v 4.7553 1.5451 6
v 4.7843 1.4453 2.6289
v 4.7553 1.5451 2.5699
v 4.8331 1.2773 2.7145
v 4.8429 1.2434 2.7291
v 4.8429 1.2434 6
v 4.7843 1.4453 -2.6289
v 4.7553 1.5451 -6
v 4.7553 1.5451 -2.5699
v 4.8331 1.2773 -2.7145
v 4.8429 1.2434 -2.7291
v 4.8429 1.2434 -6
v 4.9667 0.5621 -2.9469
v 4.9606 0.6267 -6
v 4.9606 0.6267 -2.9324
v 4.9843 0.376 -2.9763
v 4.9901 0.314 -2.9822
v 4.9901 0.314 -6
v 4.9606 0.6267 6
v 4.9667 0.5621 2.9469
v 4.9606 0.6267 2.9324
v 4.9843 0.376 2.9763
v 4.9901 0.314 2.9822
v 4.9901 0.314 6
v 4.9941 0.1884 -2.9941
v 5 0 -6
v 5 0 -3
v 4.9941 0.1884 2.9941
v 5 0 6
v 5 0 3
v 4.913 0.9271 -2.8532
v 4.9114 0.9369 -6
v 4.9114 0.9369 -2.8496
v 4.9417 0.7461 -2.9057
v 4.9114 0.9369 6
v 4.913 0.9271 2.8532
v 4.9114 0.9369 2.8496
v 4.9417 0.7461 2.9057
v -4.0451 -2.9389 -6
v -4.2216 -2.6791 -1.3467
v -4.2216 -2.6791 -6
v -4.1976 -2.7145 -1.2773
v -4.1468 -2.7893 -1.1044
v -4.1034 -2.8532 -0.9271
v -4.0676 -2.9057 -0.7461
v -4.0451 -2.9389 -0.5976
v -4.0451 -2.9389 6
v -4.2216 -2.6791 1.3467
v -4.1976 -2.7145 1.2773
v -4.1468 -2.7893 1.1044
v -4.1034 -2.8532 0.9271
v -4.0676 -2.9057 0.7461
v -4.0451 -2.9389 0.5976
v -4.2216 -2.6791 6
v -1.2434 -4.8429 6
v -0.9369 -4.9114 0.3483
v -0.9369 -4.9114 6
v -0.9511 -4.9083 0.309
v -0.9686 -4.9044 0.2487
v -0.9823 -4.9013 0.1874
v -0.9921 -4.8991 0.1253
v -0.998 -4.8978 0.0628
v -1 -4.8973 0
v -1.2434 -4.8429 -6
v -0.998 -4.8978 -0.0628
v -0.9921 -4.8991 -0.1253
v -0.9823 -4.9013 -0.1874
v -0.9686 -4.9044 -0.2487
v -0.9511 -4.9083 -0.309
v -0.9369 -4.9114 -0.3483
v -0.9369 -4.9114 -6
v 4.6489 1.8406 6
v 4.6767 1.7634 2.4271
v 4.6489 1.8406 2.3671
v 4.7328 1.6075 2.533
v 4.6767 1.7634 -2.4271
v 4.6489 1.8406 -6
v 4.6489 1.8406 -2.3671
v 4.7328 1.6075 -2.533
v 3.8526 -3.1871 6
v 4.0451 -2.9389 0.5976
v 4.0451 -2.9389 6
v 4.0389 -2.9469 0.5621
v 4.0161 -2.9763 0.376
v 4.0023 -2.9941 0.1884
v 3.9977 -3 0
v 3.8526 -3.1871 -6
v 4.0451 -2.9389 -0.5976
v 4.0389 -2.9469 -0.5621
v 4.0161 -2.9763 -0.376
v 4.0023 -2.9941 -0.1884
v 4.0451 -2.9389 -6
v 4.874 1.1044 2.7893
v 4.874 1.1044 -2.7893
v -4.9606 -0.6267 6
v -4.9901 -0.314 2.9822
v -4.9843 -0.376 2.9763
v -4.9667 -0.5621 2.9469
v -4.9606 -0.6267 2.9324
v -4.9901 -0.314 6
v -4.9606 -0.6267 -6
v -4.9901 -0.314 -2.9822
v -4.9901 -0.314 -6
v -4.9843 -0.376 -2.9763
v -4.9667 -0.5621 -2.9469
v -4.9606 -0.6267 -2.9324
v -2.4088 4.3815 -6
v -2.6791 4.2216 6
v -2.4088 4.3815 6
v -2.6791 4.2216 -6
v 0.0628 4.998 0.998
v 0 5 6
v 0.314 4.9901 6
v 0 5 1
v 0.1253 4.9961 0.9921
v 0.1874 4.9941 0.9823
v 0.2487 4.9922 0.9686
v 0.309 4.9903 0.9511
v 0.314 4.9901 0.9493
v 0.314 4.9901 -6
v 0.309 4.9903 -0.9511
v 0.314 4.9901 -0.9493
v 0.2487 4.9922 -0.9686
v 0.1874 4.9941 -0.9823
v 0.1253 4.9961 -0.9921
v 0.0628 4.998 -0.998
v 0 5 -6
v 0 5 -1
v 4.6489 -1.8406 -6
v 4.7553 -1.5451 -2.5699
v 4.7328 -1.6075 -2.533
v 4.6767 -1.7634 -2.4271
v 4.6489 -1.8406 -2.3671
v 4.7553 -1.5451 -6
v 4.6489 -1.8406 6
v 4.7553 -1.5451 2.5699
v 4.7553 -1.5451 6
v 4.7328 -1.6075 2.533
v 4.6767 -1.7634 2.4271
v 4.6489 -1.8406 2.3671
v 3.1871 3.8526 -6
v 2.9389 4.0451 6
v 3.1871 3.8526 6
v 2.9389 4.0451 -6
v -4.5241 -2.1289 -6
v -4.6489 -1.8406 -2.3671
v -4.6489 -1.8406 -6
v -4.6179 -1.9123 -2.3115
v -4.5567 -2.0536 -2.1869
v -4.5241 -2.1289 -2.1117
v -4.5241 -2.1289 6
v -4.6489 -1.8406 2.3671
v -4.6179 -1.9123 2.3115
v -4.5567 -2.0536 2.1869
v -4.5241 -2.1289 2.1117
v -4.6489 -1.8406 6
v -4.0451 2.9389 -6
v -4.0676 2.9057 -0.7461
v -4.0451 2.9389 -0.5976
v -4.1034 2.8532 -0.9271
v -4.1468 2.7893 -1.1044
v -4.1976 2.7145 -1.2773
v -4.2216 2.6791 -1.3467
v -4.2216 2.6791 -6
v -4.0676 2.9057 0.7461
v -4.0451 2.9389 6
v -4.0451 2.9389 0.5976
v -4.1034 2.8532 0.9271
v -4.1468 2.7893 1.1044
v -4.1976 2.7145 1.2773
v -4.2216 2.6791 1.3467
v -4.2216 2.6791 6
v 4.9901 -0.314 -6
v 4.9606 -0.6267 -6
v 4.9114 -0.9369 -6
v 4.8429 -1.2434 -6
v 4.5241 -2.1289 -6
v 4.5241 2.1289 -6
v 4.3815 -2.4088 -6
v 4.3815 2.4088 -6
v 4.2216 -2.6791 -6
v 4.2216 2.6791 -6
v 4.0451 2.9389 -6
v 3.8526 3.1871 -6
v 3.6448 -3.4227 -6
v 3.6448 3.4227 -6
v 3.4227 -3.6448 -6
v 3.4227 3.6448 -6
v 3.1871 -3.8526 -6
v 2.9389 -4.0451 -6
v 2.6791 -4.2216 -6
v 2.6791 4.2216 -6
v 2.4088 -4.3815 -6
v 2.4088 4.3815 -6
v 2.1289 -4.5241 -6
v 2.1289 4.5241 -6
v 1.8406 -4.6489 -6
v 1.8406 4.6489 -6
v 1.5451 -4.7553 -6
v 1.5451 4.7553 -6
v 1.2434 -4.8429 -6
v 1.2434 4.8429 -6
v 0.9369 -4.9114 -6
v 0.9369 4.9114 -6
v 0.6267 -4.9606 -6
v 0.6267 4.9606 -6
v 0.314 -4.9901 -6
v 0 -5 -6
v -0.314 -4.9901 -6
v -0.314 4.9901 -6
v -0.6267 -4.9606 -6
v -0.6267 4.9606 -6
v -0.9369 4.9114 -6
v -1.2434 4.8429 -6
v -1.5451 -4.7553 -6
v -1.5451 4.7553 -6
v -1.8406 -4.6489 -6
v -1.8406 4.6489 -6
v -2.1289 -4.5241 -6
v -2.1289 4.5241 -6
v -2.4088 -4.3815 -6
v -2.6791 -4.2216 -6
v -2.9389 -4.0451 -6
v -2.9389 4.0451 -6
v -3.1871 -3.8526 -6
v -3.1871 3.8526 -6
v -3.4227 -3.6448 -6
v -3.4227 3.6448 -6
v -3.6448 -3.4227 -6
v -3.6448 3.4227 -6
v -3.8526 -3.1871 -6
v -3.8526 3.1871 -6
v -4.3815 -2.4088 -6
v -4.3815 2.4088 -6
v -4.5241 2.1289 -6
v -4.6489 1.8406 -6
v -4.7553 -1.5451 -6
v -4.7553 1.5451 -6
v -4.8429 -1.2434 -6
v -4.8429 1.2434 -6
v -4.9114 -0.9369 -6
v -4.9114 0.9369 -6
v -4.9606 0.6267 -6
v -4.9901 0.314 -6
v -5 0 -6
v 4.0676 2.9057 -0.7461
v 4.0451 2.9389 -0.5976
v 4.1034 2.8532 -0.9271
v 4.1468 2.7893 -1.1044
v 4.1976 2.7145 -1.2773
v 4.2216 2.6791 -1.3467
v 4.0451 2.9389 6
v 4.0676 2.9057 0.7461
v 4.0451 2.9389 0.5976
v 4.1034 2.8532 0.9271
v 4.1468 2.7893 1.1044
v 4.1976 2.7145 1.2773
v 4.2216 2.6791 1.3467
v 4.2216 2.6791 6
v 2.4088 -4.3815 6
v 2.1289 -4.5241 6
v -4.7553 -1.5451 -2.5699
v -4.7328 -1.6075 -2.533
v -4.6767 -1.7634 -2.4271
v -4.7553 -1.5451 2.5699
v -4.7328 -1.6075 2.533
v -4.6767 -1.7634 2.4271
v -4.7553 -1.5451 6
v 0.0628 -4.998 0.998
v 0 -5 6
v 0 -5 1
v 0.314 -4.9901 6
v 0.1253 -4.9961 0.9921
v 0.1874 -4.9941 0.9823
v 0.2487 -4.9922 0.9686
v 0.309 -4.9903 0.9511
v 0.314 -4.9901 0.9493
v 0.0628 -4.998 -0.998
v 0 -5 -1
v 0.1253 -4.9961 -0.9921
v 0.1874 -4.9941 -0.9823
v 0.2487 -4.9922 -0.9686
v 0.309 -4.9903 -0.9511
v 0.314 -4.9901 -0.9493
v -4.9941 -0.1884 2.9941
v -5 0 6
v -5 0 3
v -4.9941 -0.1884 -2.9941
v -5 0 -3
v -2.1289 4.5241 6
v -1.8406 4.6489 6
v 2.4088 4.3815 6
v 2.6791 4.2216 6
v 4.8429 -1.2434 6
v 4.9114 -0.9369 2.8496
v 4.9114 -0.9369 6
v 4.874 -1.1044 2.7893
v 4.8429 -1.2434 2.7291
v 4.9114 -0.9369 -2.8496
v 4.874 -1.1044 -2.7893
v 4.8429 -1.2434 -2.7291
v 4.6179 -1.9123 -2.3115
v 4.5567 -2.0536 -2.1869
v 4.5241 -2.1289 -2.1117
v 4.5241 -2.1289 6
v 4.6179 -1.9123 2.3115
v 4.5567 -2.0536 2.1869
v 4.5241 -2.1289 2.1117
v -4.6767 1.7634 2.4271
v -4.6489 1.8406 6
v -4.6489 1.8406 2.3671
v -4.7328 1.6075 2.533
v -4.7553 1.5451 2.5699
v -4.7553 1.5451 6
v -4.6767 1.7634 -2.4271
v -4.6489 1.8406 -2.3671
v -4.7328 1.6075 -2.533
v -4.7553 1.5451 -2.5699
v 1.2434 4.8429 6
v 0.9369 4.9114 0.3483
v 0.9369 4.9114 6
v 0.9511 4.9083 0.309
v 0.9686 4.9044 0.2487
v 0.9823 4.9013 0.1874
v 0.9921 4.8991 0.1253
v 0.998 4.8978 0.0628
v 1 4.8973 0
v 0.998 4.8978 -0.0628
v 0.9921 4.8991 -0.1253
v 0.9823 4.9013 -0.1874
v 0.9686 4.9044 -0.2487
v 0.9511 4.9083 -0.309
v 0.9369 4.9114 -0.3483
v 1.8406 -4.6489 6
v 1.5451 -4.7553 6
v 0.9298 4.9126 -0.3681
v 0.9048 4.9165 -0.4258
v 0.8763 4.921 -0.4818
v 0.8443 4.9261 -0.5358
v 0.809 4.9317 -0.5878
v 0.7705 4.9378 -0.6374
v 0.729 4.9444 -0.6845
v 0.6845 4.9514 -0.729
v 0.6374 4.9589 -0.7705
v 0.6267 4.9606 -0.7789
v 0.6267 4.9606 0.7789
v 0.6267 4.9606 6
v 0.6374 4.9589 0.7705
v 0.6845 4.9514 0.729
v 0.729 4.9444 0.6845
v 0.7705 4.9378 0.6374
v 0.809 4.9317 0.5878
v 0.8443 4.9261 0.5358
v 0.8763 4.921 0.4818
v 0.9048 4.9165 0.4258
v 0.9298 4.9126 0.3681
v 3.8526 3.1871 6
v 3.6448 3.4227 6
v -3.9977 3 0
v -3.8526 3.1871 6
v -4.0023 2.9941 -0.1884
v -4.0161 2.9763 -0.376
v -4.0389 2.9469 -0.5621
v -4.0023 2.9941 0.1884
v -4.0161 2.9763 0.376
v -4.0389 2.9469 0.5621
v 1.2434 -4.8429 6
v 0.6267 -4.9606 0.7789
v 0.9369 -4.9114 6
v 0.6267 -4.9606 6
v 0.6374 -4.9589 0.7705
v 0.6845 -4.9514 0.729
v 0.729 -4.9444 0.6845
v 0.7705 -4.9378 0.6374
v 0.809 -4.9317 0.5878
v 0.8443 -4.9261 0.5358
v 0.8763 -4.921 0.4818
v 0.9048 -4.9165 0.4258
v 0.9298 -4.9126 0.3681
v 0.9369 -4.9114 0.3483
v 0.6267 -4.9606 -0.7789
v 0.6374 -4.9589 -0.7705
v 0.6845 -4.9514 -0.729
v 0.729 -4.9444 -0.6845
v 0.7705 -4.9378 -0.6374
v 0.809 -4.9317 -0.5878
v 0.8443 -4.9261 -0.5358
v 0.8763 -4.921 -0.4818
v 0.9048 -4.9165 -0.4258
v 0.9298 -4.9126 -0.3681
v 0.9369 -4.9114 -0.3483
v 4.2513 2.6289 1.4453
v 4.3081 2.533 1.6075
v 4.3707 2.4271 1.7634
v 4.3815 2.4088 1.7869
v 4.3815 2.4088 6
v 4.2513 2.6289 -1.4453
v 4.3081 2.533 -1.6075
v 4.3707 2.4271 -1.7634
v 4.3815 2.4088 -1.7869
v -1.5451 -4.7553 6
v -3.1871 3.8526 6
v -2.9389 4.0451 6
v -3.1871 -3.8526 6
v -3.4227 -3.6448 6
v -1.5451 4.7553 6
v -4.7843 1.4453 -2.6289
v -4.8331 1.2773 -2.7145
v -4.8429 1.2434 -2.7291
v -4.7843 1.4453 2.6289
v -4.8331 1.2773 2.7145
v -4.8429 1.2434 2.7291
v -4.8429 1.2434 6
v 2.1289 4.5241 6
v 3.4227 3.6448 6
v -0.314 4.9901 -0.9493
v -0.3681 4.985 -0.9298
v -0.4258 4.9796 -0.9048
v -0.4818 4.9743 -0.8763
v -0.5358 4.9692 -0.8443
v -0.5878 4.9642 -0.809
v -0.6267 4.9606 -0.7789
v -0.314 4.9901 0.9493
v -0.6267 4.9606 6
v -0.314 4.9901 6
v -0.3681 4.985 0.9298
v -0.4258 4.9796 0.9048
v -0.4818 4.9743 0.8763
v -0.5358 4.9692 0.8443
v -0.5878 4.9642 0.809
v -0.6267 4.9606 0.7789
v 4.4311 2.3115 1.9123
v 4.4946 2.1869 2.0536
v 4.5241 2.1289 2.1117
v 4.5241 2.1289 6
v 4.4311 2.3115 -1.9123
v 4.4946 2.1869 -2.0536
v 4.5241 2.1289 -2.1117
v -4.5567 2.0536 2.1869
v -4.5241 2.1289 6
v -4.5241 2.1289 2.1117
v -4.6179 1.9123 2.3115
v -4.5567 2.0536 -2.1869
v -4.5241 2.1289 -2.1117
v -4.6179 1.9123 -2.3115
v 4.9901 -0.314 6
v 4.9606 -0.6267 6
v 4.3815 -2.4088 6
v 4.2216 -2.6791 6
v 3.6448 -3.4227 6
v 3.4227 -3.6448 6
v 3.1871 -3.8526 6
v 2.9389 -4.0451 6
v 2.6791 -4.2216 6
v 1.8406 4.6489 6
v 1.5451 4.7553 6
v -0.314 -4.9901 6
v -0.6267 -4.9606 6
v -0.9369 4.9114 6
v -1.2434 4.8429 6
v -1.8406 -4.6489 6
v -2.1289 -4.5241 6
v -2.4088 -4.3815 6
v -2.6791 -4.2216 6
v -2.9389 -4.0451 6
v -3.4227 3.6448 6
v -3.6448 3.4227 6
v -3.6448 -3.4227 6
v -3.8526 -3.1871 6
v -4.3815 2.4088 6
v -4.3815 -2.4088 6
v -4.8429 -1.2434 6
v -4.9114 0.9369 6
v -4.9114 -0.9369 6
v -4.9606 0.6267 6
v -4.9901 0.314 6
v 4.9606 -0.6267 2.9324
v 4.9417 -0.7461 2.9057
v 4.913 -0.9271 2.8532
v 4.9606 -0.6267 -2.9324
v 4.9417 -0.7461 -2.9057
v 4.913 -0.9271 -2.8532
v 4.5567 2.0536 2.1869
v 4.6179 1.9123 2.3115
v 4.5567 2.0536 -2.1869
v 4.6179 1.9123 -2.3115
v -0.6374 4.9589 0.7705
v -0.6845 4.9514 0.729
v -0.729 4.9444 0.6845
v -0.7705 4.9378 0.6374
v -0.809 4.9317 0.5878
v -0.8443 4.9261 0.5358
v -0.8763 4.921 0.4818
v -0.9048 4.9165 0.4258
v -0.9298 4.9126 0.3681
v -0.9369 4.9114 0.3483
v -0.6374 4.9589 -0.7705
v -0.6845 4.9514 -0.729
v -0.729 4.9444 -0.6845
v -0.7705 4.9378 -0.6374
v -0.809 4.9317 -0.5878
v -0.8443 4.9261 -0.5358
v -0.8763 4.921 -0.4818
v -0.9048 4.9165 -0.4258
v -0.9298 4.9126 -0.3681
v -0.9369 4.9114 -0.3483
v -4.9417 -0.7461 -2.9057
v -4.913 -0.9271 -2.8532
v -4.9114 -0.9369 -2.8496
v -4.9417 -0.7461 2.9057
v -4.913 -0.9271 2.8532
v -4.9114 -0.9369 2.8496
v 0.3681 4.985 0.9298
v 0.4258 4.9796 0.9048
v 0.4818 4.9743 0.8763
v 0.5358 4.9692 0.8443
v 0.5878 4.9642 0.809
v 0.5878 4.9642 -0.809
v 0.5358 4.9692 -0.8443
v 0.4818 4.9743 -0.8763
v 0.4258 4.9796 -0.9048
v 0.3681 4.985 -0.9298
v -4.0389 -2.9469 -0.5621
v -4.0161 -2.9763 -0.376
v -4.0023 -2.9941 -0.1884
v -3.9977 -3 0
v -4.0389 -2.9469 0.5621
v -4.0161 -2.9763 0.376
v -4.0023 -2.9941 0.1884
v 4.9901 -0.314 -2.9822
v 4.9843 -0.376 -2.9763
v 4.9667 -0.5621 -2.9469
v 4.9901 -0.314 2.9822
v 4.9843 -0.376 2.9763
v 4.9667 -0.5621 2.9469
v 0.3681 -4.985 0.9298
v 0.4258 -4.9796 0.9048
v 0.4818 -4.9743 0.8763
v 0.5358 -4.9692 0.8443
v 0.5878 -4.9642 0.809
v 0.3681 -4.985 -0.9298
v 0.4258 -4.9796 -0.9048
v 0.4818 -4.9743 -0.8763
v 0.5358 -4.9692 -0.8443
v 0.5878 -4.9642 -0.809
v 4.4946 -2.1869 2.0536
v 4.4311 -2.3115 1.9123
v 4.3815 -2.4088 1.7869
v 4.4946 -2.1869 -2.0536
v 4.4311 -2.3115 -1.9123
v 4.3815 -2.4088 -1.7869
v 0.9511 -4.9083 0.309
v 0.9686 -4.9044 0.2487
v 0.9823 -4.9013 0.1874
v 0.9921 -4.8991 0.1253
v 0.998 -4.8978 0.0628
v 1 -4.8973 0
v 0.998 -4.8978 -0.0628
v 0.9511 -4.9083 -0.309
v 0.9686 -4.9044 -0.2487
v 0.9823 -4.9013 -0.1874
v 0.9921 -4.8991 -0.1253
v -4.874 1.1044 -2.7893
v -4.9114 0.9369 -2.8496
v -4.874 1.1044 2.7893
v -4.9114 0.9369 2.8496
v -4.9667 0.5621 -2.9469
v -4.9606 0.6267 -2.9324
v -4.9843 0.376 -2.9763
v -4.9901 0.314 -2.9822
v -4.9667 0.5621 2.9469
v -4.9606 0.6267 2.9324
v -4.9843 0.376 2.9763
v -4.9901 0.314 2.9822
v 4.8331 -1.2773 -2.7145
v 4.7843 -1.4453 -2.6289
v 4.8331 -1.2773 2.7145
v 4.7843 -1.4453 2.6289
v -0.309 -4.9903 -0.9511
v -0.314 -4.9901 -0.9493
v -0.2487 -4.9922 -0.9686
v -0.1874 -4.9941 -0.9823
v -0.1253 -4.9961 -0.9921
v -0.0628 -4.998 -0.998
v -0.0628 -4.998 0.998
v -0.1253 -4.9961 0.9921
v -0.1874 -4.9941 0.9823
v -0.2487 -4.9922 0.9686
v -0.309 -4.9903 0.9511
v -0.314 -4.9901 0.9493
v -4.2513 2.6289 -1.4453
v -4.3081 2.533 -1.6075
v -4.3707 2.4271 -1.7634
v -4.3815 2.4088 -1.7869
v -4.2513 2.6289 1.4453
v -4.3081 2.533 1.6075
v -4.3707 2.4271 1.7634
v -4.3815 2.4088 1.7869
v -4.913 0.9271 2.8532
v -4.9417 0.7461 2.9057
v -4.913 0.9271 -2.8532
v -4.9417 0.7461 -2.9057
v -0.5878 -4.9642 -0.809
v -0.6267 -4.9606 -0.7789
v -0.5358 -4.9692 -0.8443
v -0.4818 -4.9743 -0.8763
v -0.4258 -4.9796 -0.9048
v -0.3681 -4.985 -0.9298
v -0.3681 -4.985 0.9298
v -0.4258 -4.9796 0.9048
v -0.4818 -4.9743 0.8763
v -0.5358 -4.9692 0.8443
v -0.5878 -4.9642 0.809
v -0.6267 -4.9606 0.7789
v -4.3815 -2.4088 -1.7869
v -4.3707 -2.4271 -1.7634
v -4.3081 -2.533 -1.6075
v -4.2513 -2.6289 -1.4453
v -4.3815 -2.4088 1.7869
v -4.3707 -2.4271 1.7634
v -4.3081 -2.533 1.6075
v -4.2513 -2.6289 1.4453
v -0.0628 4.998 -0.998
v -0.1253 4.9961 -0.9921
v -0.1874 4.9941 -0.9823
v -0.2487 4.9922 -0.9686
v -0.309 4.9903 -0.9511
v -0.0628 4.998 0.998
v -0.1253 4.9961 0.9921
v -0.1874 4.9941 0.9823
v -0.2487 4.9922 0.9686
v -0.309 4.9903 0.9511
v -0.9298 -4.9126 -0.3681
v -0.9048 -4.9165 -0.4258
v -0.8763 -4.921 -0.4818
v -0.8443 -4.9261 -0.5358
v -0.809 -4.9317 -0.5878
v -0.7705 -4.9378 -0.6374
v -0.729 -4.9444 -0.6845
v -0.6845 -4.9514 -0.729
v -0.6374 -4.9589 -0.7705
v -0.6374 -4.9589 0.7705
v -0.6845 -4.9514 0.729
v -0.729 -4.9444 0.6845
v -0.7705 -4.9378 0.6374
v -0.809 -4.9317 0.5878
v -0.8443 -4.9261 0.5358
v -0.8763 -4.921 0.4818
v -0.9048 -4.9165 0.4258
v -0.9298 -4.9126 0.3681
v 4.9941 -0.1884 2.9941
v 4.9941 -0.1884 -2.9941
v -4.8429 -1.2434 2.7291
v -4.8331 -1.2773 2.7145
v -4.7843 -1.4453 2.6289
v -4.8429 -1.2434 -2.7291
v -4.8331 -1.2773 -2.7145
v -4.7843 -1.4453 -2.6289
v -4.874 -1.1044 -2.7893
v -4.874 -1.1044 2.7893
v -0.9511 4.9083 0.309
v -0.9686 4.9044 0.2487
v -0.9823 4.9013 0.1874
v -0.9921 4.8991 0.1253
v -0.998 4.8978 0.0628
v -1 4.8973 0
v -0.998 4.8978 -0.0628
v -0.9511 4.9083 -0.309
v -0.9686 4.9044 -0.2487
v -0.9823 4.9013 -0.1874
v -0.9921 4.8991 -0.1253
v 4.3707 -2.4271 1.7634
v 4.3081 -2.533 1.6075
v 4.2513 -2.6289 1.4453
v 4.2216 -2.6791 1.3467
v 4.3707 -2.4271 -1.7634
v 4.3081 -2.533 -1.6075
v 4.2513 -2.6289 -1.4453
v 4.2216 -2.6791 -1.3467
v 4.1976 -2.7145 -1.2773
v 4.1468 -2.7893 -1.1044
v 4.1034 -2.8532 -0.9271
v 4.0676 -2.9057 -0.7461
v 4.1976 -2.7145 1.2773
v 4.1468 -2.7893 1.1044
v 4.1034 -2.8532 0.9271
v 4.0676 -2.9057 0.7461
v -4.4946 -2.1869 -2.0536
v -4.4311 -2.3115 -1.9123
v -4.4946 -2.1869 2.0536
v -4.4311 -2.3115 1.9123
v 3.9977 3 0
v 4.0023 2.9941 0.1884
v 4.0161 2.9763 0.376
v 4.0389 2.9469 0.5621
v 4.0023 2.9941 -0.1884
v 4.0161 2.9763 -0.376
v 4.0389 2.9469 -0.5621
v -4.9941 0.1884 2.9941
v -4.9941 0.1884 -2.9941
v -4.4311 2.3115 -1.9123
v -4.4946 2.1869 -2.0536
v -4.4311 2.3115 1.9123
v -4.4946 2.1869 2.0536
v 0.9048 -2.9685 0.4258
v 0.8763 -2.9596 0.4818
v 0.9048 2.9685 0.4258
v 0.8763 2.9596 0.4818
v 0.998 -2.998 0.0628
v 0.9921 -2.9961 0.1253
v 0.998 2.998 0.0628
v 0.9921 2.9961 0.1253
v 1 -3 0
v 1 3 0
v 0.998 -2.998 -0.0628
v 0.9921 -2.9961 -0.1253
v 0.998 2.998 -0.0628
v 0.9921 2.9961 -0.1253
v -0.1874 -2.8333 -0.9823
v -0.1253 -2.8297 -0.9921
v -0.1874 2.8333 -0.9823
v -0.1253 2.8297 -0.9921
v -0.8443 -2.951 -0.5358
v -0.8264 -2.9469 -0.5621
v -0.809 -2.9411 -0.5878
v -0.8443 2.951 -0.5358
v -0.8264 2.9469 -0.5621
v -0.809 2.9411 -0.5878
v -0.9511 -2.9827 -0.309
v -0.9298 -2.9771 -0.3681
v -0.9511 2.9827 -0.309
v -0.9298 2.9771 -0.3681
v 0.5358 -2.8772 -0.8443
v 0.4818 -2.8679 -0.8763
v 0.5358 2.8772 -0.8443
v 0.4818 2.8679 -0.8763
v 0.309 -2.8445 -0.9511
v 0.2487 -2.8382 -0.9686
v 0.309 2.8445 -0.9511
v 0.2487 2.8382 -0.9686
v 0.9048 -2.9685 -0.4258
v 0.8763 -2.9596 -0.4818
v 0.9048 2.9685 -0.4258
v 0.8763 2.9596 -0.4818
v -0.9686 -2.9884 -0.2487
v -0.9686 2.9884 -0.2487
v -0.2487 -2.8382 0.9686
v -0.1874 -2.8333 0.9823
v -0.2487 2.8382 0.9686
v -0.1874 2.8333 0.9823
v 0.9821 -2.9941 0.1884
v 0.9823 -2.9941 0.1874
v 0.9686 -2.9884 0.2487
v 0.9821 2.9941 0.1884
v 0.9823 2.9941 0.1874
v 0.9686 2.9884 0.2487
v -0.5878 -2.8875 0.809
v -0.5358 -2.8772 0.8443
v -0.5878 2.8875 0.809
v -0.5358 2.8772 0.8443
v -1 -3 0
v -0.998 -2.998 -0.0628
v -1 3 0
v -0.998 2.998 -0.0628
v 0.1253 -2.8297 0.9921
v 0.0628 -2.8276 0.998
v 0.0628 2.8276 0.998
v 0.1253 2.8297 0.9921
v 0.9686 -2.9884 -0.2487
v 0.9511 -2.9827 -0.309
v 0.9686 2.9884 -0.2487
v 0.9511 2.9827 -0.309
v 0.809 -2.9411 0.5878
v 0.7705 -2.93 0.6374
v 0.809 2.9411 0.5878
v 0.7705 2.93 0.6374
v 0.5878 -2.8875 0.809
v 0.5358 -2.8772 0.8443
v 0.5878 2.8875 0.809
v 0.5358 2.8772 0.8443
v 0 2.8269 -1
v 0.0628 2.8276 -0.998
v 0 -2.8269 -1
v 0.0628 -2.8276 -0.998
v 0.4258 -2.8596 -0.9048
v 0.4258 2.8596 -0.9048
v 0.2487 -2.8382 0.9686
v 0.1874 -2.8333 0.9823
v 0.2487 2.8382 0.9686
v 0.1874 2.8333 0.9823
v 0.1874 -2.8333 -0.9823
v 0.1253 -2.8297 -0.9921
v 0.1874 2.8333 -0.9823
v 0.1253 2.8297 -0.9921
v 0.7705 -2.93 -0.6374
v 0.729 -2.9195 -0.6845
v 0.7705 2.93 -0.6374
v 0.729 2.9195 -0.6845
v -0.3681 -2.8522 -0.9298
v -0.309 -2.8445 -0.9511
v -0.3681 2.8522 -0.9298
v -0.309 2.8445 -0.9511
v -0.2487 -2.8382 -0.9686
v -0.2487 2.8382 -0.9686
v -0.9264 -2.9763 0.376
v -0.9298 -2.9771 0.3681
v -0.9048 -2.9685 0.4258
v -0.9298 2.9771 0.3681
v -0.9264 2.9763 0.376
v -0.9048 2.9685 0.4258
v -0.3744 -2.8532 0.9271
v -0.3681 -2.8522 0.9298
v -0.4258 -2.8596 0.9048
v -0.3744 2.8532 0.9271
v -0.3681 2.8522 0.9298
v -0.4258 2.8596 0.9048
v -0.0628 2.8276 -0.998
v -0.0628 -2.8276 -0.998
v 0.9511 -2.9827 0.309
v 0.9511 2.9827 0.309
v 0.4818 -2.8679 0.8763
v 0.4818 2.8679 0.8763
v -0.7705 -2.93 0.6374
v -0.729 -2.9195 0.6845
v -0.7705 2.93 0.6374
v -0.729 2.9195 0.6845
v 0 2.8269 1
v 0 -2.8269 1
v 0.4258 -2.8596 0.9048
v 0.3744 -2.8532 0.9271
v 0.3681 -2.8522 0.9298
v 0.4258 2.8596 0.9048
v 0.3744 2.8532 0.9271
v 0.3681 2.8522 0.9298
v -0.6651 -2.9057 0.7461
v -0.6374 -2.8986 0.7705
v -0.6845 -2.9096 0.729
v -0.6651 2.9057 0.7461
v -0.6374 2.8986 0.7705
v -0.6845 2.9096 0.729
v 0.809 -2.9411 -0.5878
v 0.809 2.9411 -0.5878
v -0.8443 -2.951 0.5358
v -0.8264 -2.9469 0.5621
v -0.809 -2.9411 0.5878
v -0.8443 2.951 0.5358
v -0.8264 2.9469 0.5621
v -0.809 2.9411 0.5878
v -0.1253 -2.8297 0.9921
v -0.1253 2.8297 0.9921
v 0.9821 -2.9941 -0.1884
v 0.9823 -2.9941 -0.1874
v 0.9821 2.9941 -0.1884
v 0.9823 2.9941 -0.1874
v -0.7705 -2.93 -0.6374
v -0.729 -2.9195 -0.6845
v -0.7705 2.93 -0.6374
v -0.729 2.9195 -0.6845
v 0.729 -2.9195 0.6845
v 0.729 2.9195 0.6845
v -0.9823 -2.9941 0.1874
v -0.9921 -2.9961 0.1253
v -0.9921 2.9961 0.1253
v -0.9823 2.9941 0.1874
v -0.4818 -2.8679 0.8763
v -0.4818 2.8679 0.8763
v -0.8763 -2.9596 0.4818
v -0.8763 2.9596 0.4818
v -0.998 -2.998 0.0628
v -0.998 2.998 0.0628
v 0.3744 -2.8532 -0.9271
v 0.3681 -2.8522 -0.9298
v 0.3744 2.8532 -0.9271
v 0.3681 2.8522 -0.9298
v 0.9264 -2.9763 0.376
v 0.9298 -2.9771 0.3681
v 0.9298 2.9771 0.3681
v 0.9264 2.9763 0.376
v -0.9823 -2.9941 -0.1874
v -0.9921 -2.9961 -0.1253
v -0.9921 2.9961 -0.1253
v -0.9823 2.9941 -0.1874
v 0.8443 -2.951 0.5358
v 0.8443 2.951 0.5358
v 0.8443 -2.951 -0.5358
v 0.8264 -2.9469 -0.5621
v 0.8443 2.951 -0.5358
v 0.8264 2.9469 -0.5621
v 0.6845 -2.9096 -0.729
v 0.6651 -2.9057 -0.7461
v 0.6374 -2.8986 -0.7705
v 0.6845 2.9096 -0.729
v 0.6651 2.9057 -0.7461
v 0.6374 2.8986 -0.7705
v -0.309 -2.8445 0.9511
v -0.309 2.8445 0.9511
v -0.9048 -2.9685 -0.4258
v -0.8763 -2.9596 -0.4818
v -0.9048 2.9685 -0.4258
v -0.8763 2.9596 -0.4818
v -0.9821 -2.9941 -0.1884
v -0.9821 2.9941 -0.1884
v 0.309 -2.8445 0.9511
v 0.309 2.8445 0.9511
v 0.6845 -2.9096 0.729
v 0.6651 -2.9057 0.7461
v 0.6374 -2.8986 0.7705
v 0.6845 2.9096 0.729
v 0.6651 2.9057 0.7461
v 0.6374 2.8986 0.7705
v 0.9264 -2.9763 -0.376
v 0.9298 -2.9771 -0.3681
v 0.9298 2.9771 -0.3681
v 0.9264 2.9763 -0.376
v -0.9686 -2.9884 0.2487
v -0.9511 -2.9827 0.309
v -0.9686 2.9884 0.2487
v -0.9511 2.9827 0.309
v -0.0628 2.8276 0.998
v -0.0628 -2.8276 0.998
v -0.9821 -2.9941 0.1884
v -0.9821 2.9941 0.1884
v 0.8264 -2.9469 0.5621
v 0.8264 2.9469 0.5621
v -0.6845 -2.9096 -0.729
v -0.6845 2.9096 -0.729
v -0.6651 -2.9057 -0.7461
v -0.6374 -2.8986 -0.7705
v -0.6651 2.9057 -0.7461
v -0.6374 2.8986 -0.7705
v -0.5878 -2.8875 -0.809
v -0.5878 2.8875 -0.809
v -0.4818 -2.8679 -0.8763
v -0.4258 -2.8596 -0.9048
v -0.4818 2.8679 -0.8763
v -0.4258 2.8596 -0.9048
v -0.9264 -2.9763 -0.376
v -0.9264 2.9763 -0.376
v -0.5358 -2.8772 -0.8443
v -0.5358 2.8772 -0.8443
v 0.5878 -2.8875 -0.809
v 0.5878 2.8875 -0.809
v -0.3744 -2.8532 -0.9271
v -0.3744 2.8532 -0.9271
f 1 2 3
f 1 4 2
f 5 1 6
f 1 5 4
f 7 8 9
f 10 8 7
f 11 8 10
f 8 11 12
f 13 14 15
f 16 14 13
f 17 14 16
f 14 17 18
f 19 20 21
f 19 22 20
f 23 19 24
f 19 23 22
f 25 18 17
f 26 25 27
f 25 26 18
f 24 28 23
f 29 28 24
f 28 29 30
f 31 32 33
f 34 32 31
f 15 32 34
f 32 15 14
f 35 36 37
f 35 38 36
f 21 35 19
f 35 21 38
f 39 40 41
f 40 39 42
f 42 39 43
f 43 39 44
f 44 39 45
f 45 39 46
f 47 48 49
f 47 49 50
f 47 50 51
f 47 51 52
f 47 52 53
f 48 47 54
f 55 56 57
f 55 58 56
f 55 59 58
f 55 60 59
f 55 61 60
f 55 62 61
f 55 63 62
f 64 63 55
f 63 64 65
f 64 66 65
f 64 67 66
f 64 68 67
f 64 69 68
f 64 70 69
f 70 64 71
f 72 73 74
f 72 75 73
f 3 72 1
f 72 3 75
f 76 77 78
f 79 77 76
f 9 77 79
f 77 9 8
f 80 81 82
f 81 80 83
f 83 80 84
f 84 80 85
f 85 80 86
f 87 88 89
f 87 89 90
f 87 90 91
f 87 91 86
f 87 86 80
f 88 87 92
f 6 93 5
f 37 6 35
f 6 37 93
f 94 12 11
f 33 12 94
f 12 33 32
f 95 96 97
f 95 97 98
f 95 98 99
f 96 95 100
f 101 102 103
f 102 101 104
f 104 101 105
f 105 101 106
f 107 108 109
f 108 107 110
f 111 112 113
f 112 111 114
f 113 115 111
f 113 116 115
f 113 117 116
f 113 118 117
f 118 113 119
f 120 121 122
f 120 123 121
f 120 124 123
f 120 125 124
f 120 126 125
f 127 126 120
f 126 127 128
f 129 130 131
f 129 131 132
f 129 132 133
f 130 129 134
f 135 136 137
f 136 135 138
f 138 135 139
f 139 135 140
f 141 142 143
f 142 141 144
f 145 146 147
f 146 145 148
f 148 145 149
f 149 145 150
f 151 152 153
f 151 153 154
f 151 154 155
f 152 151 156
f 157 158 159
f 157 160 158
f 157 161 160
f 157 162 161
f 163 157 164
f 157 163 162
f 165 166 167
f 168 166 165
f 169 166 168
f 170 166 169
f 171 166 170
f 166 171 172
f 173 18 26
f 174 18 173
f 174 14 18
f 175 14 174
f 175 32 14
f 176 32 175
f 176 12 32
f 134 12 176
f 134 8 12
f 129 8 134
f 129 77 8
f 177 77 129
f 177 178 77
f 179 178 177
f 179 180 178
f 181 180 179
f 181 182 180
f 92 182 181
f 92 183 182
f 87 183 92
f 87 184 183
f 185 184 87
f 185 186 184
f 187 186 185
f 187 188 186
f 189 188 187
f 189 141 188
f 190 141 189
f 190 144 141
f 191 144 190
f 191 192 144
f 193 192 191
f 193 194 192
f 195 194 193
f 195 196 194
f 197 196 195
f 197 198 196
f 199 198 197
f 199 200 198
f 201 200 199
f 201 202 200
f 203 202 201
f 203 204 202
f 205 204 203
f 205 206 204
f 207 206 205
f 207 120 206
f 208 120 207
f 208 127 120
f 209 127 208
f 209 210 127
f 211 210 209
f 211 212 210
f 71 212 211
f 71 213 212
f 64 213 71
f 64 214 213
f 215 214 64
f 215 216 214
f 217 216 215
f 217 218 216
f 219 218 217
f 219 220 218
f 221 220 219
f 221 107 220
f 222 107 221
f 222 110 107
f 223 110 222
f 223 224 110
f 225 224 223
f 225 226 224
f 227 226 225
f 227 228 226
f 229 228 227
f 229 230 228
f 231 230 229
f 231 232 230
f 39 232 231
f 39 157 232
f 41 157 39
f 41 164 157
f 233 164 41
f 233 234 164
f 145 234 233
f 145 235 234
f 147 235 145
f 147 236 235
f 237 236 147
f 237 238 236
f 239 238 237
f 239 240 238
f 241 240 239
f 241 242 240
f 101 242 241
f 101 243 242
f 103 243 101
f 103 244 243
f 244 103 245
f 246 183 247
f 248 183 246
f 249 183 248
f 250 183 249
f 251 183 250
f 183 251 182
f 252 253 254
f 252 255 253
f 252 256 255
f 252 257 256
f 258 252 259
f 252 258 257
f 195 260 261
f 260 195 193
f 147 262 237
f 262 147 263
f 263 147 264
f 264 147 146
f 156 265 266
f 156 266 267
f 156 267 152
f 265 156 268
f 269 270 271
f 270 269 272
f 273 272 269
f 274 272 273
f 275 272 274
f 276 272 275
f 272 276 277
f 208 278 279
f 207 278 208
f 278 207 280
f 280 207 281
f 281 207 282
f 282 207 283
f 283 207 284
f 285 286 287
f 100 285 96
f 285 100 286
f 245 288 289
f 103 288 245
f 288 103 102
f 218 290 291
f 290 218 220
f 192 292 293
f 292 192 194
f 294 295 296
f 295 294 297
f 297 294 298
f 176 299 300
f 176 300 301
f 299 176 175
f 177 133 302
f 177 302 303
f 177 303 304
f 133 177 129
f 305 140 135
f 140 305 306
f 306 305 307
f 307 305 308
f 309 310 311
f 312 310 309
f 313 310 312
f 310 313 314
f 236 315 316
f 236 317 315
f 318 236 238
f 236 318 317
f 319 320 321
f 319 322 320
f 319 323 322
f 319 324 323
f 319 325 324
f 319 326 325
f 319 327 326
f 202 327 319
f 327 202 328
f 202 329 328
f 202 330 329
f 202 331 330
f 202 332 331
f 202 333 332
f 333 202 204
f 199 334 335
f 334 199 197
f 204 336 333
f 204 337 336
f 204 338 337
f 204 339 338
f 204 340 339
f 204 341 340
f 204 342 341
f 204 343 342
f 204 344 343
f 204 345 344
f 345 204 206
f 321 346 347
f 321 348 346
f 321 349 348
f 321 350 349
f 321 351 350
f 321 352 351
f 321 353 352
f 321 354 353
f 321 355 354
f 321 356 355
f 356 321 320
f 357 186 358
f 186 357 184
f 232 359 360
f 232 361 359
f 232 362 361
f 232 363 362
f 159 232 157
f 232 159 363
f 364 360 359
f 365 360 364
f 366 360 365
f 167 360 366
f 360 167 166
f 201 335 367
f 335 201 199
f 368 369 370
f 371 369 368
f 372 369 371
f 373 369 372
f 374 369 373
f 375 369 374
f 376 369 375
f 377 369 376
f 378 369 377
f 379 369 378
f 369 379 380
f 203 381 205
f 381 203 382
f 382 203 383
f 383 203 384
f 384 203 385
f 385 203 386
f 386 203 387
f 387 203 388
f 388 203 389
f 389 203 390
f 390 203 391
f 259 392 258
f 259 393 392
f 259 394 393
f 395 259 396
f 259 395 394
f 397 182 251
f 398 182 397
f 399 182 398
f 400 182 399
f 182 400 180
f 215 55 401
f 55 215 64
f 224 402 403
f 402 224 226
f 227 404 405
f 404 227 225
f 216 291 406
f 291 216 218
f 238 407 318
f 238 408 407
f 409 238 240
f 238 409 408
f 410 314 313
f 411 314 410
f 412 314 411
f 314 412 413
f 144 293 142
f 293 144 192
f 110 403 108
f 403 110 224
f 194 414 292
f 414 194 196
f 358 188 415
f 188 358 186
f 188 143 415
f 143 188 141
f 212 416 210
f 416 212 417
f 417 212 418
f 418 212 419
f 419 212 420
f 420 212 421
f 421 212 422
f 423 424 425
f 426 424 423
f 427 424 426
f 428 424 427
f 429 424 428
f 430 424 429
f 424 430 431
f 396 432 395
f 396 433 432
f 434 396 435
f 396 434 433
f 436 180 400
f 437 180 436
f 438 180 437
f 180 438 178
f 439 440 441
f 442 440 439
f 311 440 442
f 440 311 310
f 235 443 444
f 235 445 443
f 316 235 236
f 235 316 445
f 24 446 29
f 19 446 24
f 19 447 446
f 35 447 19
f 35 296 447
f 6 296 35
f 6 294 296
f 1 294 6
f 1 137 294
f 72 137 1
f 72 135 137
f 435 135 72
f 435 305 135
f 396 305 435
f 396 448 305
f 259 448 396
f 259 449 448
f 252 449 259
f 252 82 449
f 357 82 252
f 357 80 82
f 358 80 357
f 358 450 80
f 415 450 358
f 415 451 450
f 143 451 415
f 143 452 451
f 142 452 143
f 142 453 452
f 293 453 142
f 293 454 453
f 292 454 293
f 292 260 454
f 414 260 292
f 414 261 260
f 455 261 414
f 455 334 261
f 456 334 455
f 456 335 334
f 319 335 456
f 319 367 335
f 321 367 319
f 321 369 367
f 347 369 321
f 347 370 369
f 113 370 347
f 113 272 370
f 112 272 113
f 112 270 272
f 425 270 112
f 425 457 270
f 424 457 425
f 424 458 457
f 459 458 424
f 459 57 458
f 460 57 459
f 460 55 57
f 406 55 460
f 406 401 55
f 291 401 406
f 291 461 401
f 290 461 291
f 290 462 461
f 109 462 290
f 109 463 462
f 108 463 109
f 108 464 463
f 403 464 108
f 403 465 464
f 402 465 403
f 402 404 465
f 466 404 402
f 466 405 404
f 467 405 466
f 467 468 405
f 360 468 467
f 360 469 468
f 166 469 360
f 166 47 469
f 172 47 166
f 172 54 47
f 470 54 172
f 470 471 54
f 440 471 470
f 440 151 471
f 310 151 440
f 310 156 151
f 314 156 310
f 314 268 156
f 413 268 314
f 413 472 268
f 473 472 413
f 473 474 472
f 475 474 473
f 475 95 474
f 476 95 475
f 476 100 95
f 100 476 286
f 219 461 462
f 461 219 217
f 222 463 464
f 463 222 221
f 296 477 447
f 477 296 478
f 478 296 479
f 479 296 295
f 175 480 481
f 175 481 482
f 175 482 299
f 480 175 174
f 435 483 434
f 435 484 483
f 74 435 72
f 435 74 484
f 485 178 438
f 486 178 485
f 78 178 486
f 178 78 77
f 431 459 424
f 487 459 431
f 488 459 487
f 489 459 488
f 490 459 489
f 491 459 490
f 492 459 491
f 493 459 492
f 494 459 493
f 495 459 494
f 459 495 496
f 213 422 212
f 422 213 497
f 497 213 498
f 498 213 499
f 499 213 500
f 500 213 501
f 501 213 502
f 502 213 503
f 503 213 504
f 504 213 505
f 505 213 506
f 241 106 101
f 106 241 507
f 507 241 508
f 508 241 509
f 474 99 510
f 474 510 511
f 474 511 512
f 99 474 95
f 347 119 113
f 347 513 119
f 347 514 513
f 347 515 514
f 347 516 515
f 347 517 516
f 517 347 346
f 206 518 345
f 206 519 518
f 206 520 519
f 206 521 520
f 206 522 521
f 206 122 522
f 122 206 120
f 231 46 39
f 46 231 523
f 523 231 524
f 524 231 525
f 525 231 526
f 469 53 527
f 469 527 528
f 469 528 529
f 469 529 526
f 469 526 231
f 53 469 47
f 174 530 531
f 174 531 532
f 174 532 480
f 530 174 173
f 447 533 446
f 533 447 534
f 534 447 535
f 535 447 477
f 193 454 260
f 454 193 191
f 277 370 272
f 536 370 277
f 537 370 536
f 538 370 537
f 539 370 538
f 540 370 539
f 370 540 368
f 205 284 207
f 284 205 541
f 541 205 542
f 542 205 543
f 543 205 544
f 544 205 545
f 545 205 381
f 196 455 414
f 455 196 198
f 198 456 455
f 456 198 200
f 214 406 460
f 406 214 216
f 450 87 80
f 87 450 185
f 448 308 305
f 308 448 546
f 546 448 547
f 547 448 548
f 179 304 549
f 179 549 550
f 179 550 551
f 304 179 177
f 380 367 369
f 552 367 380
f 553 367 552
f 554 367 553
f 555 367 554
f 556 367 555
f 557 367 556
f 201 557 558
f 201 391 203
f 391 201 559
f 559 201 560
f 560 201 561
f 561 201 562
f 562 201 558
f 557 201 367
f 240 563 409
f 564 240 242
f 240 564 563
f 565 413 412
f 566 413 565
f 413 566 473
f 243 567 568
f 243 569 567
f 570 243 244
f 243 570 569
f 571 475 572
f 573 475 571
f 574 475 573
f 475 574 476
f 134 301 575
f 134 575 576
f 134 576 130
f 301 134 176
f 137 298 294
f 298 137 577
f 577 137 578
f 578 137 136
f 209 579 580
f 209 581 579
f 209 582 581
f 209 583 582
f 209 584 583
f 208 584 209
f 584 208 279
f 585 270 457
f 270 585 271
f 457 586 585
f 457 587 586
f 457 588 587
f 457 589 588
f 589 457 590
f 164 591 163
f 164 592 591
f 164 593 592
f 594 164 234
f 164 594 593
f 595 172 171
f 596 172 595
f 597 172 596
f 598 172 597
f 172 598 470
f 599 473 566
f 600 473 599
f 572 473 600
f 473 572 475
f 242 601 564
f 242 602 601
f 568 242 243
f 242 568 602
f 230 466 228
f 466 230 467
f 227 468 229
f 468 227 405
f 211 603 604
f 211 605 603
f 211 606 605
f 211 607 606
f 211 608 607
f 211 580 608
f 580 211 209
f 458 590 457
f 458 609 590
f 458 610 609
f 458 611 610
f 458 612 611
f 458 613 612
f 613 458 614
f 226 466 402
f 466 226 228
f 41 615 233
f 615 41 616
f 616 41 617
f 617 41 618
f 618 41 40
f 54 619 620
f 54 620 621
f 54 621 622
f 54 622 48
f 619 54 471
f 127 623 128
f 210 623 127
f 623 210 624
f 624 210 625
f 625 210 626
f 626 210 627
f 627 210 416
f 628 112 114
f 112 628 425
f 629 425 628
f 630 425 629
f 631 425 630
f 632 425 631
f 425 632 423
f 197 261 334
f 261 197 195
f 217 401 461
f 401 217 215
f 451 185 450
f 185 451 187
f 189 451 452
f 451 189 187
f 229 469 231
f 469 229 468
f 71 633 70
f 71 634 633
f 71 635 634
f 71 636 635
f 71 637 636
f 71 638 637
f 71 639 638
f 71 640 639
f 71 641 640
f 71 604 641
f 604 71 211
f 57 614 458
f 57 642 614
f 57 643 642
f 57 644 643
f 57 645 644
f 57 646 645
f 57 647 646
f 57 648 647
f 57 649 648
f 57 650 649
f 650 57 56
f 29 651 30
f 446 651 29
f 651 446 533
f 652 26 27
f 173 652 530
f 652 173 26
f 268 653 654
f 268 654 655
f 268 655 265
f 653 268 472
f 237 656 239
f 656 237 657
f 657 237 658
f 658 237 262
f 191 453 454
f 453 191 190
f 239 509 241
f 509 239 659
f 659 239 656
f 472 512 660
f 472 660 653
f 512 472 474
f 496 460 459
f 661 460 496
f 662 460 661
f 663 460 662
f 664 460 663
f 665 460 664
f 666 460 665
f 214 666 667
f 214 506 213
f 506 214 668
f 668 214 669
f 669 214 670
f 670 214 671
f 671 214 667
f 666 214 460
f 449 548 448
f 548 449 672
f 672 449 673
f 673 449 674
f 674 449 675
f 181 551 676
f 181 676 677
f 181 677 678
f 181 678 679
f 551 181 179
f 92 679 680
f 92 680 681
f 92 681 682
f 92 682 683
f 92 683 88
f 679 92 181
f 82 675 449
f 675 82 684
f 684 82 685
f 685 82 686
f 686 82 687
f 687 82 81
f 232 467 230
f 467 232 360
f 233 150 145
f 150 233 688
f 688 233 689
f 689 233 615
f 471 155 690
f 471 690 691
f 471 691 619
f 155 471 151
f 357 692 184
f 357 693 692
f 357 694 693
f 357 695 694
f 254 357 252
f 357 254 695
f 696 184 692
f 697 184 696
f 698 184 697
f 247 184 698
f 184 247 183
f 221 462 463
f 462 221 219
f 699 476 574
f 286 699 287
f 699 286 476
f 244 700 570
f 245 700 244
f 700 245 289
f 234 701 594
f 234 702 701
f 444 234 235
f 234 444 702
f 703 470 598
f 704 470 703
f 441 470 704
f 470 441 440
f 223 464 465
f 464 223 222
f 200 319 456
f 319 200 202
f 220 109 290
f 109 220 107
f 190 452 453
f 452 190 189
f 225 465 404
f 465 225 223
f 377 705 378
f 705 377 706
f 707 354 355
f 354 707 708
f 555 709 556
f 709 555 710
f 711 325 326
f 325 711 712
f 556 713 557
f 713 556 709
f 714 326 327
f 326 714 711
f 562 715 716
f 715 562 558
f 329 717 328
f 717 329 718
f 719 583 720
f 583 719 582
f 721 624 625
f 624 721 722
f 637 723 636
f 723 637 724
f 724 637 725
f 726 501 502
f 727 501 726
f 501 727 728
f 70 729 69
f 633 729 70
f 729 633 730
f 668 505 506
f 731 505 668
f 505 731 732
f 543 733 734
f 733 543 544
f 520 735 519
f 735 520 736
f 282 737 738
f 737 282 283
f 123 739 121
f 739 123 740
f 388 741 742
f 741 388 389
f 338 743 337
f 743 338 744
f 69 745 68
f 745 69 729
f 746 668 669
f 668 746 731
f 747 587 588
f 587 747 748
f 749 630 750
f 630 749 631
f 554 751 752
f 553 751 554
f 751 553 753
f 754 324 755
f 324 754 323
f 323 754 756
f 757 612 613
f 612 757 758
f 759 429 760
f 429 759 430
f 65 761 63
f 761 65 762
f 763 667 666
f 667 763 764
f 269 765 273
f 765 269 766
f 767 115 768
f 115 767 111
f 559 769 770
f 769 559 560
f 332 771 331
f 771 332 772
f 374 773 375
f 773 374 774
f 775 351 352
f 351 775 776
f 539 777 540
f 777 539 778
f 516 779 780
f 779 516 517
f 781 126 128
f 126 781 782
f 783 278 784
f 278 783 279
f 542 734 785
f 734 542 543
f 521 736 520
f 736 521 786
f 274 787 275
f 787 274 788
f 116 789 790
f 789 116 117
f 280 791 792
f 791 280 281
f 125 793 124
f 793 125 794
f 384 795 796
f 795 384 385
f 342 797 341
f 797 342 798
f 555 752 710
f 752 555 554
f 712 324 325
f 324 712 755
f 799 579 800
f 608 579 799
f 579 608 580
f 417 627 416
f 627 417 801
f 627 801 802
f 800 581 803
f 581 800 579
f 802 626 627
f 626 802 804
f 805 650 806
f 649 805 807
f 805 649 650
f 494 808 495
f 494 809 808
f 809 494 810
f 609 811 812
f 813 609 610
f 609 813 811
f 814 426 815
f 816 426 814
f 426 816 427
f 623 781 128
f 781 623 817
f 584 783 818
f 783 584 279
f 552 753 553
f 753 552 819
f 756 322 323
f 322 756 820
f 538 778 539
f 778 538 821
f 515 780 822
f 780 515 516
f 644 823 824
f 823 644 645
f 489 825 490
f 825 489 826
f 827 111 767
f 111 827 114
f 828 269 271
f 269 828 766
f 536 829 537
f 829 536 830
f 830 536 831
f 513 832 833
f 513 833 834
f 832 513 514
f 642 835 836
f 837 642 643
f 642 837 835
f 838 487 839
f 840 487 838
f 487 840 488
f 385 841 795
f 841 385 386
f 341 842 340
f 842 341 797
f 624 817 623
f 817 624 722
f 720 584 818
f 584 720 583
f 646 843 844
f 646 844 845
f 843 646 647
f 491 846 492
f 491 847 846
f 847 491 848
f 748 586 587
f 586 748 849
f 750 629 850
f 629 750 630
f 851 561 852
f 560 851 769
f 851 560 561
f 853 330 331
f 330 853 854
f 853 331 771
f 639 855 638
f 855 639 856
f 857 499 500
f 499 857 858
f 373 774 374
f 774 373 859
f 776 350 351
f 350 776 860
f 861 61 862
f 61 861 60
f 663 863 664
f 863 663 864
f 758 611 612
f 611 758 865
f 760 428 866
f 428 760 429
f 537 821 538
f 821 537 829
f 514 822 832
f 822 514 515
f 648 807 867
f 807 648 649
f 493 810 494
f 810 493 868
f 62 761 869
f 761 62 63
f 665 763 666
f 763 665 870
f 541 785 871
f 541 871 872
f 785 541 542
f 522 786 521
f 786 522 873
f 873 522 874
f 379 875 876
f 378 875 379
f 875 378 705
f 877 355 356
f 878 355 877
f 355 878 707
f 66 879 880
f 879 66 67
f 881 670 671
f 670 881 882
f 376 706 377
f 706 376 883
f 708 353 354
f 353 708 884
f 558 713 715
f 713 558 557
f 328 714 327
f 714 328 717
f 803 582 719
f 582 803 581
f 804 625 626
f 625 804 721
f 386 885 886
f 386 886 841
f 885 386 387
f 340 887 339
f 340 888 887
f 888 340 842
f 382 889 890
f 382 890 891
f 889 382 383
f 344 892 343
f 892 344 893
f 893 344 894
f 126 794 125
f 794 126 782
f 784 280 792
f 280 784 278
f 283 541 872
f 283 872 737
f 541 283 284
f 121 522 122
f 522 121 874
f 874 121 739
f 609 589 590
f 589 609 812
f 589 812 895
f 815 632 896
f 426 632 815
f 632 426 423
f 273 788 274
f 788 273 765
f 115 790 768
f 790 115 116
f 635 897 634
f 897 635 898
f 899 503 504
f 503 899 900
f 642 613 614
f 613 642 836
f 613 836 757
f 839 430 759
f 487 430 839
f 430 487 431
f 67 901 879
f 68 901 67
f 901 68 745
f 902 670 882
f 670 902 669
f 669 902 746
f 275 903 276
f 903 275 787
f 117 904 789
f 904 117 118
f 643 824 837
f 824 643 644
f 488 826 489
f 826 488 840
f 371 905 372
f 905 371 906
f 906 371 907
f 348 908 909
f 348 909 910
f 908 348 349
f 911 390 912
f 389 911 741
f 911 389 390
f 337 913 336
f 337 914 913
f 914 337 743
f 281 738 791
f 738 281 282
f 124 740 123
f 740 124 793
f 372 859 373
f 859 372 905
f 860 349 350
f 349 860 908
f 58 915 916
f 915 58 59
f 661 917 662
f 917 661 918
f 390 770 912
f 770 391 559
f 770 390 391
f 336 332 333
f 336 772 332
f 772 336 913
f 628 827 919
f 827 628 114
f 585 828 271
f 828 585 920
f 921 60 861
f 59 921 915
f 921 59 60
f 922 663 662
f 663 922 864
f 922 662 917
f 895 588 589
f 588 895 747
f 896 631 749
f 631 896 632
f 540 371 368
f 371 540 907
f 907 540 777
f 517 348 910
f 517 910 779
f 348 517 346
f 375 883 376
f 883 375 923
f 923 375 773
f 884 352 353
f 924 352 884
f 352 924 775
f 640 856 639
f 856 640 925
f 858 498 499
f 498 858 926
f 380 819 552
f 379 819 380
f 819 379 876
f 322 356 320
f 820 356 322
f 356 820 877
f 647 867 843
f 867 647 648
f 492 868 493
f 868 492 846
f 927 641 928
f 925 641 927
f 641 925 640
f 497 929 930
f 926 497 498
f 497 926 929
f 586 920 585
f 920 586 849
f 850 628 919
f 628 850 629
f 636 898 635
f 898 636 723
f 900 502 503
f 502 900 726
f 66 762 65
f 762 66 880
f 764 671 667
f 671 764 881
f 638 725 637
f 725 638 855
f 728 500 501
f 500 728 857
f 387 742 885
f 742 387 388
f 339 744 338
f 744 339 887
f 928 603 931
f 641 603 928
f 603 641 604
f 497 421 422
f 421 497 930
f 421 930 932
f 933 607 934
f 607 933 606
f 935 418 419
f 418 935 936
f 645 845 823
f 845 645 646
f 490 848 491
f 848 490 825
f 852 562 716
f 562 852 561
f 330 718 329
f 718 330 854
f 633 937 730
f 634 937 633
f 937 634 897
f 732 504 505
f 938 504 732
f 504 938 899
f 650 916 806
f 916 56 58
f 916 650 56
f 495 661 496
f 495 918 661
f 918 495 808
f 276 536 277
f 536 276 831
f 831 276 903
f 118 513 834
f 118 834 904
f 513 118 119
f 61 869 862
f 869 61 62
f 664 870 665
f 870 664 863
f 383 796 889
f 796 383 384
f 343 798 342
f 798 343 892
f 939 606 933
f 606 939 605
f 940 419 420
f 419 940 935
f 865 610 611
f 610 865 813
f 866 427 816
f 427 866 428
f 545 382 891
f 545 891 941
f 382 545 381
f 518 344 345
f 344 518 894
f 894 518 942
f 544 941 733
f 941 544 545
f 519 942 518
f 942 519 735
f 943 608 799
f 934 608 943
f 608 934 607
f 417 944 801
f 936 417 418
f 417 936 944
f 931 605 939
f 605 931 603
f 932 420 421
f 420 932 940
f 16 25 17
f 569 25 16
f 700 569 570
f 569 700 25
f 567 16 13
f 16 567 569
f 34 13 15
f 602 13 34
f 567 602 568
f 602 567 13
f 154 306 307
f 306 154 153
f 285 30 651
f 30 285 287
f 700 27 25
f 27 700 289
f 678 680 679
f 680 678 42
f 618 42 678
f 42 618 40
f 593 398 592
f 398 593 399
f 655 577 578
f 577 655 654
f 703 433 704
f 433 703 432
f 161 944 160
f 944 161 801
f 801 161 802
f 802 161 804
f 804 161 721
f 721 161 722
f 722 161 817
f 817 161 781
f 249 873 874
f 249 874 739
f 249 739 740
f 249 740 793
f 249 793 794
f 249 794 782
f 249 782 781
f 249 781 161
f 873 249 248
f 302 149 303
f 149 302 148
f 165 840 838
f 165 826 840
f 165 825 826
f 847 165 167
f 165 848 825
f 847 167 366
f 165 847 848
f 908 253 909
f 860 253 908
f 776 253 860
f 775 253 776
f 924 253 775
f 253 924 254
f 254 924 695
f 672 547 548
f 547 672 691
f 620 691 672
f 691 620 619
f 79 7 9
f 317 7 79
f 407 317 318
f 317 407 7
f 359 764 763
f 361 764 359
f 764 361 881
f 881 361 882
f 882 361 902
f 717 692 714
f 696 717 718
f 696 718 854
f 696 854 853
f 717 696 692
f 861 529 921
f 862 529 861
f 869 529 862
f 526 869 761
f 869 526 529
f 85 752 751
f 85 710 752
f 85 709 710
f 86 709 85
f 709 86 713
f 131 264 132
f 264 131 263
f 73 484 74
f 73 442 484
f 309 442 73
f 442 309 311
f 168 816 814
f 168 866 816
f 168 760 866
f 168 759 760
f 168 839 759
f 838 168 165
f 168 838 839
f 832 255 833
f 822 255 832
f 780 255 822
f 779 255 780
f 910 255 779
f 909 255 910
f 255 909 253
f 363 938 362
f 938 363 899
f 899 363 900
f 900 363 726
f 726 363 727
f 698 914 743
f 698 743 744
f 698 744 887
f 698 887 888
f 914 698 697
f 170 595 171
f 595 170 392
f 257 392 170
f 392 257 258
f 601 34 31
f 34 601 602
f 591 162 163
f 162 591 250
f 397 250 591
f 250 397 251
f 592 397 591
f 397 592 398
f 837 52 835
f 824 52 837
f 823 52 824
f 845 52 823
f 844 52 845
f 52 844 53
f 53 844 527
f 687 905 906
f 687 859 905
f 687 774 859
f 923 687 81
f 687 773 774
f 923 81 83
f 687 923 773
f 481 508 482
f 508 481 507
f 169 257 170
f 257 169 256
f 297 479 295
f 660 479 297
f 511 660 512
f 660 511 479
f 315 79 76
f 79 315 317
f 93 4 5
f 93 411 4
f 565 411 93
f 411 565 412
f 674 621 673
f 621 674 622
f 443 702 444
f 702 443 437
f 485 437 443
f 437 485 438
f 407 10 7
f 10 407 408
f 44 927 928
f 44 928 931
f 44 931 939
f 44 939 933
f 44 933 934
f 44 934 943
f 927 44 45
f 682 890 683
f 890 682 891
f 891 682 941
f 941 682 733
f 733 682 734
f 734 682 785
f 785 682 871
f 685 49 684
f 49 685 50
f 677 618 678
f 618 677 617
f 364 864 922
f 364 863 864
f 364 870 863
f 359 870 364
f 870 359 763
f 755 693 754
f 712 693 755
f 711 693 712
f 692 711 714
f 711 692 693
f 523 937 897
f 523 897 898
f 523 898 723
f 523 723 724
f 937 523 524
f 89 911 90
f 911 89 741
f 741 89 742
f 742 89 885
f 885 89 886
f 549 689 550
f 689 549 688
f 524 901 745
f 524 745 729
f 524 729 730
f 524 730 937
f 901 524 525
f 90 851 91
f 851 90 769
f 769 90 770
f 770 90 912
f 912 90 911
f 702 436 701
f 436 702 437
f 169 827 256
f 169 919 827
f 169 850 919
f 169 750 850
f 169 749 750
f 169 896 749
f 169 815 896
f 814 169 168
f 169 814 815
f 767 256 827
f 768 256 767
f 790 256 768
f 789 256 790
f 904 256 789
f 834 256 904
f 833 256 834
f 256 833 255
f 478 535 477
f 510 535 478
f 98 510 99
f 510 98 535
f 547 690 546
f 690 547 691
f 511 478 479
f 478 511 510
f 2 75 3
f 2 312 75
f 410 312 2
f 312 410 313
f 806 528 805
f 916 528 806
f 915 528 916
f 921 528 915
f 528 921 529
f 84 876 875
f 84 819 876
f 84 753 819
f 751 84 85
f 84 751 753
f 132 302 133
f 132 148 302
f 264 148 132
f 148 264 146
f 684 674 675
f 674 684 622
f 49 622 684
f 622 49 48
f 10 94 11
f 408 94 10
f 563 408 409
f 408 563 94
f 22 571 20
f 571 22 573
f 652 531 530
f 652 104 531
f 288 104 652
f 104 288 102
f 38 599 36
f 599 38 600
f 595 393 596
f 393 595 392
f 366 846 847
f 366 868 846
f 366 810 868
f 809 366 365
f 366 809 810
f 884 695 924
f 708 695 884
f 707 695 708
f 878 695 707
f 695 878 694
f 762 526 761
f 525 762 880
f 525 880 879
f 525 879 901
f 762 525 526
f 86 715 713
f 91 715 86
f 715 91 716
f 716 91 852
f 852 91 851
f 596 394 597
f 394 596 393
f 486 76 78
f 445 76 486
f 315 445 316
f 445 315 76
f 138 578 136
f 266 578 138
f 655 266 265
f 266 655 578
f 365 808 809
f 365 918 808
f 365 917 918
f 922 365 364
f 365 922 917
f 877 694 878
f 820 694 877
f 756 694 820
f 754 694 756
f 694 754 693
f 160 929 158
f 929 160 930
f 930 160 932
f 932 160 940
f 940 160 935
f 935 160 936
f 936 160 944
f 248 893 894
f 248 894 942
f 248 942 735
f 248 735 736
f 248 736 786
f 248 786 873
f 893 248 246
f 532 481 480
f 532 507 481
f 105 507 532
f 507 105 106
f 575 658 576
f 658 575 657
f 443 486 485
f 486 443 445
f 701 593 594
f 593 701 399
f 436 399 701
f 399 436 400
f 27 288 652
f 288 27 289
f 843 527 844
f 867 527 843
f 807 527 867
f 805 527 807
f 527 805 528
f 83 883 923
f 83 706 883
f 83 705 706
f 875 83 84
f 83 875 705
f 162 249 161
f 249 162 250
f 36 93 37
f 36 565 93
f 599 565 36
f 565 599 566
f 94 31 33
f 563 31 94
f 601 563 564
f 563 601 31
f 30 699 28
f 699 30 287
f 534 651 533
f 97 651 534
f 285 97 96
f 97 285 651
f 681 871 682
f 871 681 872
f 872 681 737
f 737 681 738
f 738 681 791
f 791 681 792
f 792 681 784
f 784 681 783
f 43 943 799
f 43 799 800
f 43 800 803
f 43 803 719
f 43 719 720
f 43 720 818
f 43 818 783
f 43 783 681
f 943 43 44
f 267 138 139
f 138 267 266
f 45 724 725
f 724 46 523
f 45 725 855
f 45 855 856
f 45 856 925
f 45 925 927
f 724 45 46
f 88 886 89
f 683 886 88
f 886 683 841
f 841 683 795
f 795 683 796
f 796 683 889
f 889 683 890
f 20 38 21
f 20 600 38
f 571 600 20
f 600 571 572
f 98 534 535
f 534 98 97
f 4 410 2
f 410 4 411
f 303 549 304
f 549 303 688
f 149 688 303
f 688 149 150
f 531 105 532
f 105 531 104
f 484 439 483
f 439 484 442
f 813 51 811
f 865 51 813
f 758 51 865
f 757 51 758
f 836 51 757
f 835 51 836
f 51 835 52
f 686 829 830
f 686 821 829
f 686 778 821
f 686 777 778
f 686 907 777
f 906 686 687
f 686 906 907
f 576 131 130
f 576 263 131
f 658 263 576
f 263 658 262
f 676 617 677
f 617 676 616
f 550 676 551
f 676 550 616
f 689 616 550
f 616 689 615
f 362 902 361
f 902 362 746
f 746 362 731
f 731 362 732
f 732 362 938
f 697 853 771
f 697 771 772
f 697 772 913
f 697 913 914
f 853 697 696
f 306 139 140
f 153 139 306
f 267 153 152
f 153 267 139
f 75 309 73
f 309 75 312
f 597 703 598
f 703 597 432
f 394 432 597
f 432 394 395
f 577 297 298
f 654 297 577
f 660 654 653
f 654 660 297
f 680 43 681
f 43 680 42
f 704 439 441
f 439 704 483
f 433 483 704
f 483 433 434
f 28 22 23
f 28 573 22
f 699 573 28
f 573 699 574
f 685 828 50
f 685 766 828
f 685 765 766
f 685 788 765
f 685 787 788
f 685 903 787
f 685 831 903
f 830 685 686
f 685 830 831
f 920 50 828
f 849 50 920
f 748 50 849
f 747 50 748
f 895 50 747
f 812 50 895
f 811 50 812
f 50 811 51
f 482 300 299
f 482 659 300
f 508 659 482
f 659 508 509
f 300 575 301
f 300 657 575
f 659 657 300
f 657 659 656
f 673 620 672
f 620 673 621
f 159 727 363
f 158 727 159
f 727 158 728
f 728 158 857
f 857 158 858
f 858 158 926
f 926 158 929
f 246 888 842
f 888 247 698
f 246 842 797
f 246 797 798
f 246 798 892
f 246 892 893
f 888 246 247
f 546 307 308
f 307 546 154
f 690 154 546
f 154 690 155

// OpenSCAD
// Unit of length: Unit.MM
difference()
{
   cylinder(h = 12.0, d = 10.0, center = true, $fn = 100);
   rotate(a = [90.0, 0.0, 0.0])
   {
      cylinder(h = 15.0, d = 2.0, center = true, $fn = 100);
   }
   #union()
   {
      rotate(a = [0.0, 90.0, 0.0])
      {
         cylinder(h = 15.0, d = 6.0, center = true, $fn = 100);
      }
   }
}
